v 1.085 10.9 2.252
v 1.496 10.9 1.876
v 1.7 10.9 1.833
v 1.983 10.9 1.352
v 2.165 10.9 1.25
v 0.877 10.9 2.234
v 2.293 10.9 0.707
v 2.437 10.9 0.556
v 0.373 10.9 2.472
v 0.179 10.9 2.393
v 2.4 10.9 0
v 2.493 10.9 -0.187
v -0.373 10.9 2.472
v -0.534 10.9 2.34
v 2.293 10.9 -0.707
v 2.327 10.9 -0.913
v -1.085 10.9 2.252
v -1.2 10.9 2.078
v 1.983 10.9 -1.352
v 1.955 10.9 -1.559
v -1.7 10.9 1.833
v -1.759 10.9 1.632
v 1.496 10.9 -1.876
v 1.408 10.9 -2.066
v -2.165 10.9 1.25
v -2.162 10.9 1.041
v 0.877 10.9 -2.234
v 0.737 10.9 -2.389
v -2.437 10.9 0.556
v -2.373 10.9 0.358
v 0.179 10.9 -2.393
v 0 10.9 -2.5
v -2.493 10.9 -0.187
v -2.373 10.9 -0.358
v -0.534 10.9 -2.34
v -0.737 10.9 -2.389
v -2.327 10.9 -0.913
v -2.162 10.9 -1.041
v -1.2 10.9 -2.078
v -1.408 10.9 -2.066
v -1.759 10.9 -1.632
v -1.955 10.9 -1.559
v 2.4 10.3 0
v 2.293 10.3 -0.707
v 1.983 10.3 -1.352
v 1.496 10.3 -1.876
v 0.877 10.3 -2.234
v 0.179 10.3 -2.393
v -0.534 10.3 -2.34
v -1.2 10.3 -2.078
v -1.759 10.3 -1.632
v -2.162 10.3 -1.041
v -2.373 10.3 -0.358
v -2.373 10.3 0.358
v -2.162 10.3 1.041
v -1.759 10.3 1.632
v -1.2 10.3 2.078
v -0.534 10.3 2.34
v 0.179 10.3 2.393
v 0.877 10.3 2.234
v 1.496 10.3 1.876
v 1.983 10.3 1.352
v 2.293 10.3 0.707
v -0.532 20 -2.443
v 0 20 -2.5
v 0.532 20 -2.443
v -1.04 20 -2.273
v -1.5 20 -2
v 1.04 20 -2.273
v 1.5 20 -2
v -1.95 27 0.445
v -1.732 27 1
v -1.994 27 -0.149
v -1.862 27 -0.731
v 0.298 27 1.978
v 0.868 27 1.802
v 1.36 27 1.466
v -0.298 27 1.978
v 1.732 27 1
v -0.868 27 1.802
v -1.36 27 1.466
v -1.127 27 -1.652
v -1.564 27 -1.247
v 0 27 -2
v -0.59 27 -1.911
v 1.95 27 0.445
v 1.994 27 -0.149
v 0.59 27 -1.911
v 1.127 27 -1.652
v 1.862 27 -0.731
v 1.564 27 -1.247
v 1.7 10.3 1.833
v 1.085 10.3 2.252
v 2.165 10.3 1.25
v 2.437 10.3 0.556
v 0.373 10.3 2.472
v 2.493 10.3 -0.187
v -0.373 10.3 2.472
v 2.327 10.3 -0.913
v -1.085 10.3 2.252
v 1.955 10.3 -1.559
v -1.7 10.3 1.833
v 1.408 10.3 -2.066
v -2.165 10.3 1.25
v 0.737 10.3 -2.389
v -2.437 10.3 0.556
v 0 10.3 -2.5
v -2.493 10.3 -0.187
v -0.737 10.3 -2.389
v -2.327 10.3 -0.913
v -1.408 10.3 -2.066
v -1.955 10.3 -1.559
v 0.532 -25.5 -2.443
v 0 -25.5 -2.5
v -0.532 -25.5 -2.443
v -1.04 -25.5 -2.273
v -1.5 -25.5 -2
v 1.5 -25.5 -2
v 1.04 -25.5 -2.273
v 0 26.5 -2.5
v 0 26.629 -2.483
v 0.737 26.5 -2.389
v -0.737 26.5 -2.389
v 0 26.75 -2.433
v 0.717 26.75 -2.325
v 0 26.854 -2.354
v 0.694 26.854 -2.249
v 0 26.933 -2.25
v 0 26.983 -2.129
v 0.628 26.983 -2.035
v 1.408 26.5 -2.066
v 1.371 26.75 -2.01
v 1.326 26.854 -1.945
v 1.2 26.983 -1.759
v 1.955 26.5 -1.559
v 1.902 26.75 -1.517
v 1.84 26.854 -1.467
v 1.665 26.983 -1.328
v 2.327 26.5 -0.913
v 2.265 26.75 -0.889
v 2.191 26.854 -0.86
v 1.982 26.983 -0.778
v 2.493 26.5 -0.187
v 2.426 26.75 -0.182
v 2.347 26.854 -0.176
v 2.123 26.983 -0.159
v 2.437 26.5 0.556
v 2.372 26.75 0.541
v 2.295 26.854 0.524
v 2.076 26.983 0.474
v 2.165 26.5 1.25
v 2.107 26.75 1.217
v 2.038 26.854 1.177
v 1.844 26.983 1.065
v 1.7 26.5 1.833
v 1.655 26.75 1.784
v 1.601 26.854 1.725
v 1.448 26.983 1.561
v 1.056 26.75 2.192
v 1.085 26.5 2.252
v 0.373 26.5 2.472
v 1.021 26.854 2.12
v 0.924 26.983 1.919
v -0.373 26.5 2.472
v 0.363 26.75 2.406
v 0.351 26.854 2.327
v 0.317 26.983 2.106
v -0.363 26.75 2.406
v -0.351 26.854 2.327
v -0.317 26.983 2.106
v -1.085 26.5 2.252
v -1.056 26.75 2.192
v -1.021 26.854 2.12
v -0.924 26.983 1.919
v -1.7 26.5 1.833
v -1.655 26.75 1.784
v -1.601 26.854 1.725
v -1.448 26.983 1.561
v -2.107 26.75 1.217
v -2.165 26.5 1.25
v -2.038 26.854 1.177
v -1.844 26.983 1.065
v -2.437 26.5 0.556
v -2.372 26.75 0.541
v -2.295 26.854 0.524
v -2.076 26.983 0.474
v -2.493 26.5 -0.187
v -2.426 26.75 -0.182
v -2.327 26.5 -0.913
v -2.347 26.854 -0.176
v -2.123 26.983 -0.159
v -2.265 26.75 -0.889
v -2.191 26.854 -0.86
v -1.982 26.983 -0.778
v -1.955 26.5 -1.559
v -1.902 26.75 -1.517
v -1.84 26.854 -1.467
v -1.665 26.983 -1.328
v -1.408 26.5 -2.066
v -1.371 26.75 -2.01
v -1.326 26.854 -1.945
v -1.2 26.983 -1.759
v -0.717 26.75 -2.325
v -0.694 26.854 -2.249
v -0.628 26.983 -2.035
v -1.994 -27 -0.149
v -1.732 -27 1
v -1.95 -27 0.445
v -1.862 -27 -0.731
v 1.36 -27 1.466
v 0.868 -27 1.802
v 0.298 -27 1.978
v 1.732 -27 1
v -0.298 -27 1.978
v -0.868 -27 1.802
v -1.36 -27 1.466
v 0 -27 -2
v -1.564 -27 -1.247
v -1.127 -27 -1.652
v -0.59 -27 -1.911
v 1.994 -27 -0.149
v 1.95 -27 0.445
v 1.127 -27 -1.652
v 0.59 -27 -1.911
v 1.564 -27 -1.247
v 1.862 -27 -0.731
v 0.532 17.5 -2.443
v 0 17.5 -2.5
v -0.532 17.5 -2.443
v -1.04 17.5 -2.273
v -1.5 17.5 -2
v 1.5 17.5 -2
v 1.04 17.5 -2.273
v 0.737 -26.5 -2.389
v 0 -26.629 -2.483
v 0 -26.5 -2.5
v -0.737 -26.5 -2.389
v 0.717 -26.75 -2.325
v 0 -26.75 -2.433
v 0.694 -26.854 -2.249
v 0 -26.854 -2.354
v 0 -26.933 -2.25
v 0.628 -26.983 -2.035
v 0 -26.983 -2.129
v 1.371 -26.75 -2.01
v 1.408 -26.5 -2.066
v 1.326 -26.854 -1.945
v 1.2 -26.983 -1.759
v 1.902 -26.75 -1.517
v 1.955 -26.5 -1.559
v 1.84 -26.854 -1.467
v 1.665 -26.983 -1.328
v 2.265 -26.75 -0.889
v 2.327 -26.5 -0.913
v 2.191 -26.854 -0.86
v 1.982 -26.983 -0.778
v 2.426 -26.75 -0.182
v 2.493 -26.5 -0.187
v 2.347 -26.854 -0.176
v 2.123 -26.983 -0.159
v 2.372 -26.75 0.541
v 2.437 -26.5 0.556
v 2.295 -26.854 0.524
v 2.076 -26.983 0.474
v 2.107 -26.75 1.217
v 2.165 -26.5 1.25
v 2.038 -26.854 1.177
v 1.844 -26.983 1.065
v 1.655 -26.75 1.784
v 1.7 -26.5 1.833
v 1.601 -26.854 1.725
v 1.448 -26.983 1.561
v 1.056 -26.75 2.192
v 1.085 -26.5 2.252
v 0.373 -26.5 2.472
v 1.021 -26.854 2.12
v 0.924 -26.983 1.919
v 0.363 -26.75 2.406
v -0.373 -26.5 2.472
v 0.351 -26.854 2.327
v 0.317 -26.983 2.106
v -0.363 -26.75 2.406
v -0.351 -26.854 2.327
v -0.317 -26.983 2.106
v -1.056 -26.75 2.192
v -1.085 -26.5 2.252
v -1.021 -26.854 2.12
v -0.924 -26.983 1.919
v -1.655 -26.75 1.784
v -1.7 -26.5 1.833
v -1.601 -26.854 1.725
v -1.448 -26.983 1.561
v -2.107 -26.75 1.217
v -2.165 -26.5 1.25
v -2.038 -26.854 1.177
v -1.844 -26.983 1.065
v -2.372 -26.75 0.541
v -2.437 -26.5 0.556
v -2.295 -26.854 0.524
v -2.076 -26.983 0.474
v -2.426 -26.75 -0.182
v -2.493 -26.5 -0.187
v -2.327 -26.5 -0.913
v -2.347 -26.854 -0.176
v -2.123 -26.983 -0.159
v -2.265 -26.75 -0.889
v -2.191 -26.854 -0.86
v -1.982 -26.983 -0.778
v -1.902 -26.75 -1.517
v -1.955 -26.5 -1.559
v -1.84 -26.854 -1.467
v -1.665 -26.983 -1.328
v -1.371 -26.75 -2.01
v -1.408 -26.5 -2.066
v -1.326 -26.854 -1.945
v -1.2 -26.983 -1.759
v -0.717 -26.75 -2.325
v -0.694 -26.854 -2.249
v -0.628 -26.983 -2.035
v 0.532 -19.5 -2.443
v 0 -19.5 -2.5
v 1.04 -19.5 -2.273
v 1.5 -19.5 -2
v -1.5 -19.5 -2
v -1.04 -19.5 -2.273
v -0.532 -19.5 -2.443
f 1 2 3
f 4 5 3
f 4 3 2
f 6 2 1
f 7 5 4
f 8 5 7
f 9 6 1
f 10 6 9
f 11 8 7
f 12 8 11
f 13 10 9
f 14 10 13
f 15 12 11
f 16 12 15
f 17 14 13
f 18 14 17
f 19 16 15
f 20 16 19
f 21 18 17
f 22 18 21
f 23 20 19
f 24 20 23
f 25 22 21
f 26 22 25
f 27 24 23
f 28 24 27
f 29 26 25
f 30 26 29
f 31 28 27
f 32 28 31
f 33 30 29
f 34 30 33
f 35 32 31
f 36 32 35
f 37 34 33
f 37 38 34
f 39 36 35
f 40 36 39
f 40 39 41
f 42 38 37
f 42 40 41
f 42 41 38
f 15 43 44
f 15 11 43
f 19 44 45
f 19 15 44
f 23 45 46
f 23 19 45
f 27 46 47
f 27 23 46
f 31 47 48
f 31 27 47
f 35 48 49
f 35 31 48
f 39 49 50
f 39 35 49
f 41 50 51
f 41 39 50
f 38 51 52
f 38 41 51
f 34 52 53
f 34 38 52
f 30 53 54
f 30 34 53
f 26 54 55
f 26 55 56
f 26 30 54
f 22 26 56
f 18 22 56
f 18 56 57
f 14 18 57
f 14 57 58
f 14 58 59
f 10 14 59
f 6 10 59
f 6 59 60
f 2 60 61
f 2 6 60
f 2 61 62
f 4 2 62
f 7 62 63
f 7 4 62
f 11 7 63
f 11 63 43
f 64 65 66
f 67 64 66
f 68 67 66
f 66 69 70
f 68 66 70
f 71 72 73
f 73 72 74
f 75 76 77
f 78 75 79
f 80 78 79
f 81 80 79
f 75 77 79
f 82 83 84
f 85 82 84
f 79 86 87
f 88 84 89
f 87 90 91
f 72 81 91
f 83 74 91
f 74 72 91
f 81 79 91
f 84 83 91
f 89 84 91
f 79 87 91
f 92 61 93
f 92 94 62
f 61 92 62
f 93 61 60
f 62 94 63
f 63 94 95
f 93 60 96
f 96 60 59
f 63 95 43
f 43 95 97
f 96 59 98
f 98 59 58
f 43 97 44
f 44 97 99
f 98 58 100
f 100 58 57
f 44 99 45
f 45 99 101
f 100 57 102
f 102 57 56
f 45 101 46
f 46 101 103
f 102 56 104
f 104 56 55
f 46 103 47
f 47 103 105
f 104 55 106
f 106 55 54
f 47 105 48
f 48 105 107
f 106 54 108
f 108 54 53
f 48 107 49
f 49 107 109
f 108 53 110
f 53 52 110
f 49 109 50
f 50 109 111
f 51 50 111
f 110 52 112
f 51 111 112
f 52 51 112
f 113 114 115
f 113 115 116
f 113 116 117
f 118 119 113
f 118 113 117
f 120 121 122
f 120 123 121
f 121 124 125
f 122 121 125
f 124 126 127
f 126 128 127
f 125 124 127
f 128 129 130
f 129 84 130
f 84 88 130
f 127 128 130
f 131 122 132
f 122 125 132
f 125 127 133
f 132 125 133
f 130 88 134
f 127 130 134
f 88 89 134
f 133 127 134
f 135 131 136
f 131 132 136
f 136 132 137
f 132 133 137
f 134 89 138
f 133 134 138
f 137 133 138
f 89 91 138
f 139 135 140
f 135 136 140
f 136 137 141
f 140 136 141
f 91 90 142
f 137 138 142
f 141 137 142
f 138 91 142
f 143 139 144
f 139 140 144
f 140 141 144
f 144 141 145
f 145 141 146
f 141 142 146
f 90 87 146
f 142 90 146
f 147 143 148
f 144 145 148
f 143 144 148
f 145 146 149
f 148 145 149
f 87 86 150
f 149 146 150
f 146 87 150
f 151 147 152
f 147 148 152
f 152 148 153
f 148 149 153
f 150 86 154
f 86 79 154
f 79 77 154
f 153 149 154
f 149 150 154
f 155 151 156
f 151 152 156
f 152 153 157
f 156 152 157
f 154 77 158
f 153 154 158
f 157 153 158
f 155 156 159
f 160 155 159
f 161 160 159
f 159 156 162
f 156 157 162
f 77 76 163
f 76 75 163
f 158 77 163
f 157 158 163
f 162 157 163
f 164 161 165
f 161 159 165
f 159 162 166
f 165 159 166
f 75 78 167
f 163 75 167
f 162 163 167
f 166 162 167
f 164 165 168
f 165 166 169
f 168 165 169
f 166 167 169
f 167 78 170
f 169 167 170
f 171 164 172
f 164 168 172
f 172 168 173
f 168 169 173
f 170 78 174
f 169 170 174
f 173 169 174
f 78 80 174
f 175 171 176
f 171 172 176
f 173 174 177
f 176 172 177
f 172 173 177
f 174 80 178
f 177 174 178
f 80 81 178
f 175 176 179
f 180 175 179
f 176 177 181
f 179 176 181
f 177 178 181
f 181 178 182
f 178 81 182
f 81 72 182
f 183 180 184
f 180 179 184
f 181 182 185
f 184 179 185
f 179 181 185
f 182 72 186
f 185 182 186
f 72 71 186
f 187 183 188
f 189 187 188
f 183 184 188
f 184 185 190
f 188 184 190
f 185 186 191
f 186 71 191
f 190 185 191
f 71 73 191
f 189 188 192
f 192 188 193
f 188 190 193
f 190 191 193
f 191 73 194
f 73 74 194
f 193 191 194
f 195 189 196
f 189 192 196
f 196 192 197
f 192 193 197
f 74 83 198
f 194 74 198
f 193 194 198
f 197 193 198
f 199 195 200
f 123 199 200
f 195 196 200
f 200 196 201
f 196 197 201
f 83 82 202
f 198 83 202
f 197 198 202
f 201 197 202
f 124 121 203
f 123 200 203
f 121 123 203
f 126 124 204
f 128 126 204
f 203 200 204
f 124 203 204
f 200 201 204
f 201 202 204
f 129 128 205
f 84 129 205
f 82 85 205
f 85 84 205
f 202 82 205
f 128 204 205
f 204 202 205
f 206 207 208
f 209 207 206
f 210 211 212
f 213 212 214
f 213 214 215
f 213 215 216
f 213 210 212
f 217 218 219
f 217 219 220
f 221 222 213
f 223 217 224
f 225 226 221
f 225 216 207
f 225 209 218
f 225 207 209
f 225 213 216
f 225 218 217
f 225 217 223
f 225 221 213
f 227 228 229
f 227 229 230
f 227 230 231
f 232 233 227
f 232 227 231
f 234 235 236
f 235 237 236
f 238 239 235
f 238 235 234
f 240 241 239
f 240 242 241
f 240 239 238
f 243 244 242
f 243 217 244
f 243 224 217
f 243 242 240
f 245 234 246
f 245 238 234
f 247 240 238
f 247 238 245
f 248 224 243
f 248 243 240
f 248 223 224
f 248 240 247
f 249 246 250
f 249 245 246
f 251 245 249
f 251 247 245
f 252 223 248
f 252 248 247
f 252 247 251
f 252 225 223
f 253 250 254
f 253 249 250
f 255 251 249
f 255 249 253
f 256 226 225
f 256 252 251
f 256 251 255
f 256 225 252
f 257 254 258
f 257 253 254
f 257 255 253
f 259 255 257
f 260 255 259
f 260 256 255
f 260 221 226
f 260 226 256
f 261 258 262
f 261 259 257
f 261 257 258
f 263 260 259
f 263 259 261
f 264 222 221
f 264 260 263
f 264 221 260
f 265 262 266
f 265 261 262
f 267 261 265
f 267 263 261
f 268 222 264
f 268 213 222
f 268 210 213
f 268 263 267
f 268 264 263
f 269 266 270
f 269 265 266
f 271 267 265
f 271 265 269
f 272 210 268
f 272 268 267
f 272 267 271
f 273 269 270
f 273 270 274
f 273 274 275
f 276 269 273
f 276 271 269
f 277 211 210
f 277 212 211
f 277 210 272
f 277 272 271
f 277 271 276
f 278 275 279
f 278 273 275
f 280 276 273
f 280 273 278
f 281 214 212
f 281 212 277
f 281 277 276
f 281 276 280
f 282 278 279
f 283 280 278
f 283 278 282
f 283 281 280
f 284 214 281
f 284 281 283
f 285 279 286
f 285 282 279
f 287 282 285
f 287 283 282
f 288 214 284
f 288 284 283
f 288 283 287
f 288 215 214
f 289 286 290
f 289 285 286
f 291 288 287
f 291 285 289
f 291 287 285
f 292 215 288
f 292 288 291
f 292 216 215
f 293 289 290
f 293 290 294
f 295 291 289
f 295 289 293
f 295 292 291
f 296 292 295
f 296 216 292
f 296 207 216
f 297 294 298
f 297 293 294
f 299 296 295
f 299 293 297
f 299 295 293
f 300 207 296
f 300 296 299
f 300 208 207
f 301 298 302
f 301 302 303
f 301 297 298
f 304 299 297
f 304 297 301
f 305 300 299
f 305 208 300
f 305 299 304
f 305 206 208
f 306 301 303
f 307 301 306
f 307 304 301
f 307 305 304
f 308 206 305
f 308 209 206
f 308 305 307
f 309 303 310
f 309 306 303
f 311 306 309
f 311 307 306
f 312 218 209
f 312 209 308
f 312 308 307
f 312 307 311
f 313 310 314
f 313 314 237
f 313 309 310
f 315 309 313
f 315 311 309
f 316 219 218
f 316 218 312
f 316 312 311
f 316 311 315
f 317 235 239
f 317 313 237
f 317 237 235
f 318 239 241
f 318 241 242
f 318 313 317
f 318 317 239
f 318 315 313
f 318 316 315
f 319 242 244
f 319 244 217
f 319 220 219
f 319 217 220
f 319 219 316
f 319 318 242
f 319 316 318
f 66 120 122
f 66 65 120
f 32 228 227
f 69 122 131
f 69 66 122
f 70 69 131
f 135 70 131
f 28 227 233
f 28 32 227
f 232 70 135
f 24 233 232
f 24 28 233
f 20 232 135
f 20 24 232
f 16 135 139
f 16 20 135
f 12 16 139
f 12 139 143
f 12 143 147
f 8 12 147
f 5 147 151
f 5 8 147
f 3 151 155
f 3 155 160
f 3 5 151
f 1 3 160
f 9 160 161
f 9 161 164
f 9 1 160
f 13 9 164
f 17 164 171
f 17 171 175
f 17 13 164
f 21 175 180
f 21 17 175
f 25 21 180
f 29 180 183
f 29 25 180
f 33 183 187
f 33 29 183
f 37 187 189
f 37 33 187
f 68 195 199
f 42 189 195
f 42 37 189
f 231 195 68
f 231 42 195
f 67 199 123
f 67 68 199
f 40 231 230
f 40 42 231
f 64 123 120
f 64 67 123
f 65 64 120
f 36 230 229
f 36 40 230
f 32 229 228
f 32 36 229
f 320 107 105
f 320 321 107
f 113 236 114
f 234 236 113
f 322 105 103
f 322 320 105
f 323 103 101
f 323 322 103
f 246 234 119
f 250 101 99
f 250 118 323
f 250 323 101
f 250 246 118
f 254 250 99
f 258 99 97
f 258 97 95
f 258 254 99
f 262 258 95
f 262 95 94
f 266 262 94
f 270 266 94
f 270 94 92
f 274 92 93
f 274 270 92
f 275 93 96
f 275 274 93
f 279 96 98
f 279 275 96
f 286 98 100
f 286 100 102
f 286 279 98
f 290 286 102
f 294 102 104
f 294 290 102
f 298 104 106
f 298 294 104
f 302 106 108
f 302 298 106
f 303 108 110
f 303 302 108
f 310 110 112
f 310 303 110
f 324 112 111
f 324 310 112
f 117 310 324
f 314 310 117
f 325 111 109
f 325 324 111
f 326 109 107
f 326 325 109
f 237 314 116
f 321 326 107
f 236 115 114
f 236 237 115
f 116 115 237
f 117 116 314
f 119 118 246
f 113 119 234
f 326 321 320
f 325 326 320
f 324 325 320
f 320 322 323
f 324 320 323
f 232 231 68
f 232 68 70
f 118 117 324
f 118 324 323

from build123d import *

# Parameters (mm, degrees)
SKETCH1_R           = 2.5
BOSS_EXTRUDE1_DEPTH = 27
CUT_EXTRUDE2_START  = -9.5
CUT_EXTRUDE2_DEPTH  = 2.5
CUT_EXTRUDE3_START  = -52.5
CUT_EXTRUDE3_DEPTH  = 6
FILLET1_R           = 0.5
SKETCH5_W           = 2
SKETCH5_H           = 0.6


with BuildPart() as part:
    # Sketch1 → Boss-Extrude1 (new, symmetric)
    with BuildSketch(Plane.XZ):
        Circle(SKETCH1_R)
    extrude(amount=BOSS_EXTRUDE1_DEPTH, both=True)

    # Sketch4 → Cut-Extrude2 (cut)
    with BuildSketch(Plane(origin=(0, 27, 0), x_dir=(1, 0, 0), z_dir=(0, 1, 0)).offset(CUT_EXTRUDE2_START)):
        with BuildLine():
            Line((-1.5, 2), (1.5, 2))
            ThreePointArc((1.5, 2), (0, 2.5), (-1.5, 2))
        make_face()
    extrude(amount=CUT_EXTRUDE2_DEPTH, mode=Mode.SUBTRACT)

    # Sketch4<2> → Cut-Extrude3 (cut)
    with BuildSketch(Plane(origin=(0, 27, 0), x_dir=(1, 0, 0), z_dir=(0, 1, 0)).offset(CUT_EXTRUDE3_START)):
        with BuildLine():
            Line((-1.5, 2), (1.5, 2))
            ThreePointArc((1.5, 2), (0, 2.5), (-1.5, 2))
        make_face()
    extrude(amount=CUT_EXTRUDE3_DEPTH, mode=Mode.SUBTRACT)

    # Fillet1
    fillet1_edges = [part.edges().sort_by_distance(p)[0] for p in [
        (-2.5, -27, 0),
        (-2.5, 27, 0),
    ]]
    fillet(fillet1_edges, radius=FILLET1_R)

    # Sketch5 → Cut-Revolve2 (revolve, cut)
    with BuildSketch(Plane.XY):
        with Locations((3.4, 10.6)):
            Rectangle(SKETCH5_W, SKETCH5_H)
    revolve(axis=Axis((0, 0, 0), (0, 1, 0)), mode=Mode.SUBTRACT)


solid = part.part
